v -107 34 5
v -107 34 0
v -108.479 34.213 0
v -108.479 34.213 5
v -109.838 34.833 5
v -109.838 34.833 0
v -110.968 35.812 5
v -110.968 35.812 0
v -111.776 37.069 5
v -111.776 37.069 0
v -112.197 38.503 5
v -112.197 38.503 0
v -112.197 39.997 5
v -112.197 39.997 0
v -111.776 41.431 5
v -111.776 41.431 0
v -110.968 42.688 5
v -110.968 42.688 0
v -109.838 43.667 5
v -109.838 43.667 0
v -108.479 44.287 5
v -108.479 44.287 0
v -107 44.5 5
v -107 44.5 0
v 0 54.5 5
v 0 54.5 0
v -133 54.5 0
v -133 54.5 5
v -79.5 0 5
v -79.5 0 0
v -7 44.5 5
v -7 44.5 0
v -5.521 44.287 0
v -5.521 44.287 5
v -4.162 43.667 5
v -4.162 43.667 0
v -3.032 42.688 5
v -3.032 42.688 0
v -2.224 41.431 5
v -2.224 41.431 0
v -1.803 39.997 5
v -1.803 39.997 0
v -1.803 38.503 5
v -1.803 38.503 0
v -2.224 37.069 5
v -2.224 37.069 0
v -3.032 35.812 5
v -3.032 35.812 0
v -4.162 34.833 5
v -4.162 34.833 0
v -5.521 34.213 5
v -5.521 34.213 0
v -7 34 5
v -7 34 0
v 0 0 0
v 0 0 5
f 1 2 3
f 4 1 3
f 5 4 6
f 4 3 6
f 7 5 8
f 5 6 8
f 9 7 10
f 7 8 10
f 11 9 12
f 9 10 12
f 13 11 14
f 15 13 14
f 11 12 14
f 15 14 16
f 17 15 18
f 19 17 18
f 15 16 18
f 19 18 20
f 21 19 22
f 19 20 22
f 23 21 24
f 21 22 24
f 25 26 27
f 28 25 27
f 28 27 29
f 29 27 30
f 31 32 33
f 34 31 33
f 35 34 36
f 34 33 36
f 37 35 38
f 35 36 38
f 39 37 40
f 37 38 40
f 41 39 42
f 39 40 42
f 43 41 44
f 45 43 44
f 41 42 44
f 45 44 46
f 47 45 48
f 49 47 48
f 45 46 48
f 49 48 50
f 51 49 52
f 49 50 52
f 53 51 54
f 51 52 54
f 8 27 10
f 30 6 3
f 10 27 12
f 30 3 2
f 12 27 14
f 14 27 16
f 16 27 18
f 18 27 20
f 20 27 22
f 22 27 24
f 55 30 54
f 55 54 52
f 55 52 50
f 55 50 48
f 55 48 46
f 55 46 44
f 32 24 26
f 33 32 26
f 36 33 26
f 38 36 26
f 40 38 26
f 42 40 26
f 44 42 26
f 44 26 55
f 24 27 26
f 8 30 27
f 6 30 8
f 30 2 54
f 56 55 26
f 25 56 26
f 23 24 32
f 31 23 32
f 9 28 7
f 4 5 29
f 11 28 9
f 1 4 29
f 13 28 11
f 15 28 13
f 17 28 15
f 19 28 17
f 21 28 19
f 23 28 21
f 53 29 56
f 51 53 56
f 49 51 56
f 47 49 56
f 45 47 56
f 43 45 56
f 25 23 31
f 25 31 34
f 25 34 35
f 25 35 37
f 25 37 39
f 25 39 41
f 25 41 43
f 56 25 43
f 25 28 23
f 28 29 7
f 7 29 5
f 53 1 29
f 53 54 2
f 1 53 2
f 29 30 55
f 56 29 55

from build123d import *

# Parameters (mm, degrees)
BOSS_EXTRUDE1_DEPTH = 5


with BuildPart() as part:
    # Sketch1 → Boss-Extrude1 (new body)
    with BuildSketch(Plane.XY):
        Polygon((0, 0), (0, 54.5), (-133, 54.5), (-79.5, 0), align=None)
        with BuildLine():
            Line((-107, 44.5), (-7, 44.5))
            ThreePointArc((-7, 44.5), (-1.75, 39.25), (-7, 34))
            Line((-7, 34), (-107, 34))
            ThreePointArc((-107, 34), (-112.25, 39.25), (-107, 44.5))
        make_face(mode=Mode.SUBTRACT)
    extrude(amount=BOSS_EXTRUDE1_DEPTH)


solid = part.part
